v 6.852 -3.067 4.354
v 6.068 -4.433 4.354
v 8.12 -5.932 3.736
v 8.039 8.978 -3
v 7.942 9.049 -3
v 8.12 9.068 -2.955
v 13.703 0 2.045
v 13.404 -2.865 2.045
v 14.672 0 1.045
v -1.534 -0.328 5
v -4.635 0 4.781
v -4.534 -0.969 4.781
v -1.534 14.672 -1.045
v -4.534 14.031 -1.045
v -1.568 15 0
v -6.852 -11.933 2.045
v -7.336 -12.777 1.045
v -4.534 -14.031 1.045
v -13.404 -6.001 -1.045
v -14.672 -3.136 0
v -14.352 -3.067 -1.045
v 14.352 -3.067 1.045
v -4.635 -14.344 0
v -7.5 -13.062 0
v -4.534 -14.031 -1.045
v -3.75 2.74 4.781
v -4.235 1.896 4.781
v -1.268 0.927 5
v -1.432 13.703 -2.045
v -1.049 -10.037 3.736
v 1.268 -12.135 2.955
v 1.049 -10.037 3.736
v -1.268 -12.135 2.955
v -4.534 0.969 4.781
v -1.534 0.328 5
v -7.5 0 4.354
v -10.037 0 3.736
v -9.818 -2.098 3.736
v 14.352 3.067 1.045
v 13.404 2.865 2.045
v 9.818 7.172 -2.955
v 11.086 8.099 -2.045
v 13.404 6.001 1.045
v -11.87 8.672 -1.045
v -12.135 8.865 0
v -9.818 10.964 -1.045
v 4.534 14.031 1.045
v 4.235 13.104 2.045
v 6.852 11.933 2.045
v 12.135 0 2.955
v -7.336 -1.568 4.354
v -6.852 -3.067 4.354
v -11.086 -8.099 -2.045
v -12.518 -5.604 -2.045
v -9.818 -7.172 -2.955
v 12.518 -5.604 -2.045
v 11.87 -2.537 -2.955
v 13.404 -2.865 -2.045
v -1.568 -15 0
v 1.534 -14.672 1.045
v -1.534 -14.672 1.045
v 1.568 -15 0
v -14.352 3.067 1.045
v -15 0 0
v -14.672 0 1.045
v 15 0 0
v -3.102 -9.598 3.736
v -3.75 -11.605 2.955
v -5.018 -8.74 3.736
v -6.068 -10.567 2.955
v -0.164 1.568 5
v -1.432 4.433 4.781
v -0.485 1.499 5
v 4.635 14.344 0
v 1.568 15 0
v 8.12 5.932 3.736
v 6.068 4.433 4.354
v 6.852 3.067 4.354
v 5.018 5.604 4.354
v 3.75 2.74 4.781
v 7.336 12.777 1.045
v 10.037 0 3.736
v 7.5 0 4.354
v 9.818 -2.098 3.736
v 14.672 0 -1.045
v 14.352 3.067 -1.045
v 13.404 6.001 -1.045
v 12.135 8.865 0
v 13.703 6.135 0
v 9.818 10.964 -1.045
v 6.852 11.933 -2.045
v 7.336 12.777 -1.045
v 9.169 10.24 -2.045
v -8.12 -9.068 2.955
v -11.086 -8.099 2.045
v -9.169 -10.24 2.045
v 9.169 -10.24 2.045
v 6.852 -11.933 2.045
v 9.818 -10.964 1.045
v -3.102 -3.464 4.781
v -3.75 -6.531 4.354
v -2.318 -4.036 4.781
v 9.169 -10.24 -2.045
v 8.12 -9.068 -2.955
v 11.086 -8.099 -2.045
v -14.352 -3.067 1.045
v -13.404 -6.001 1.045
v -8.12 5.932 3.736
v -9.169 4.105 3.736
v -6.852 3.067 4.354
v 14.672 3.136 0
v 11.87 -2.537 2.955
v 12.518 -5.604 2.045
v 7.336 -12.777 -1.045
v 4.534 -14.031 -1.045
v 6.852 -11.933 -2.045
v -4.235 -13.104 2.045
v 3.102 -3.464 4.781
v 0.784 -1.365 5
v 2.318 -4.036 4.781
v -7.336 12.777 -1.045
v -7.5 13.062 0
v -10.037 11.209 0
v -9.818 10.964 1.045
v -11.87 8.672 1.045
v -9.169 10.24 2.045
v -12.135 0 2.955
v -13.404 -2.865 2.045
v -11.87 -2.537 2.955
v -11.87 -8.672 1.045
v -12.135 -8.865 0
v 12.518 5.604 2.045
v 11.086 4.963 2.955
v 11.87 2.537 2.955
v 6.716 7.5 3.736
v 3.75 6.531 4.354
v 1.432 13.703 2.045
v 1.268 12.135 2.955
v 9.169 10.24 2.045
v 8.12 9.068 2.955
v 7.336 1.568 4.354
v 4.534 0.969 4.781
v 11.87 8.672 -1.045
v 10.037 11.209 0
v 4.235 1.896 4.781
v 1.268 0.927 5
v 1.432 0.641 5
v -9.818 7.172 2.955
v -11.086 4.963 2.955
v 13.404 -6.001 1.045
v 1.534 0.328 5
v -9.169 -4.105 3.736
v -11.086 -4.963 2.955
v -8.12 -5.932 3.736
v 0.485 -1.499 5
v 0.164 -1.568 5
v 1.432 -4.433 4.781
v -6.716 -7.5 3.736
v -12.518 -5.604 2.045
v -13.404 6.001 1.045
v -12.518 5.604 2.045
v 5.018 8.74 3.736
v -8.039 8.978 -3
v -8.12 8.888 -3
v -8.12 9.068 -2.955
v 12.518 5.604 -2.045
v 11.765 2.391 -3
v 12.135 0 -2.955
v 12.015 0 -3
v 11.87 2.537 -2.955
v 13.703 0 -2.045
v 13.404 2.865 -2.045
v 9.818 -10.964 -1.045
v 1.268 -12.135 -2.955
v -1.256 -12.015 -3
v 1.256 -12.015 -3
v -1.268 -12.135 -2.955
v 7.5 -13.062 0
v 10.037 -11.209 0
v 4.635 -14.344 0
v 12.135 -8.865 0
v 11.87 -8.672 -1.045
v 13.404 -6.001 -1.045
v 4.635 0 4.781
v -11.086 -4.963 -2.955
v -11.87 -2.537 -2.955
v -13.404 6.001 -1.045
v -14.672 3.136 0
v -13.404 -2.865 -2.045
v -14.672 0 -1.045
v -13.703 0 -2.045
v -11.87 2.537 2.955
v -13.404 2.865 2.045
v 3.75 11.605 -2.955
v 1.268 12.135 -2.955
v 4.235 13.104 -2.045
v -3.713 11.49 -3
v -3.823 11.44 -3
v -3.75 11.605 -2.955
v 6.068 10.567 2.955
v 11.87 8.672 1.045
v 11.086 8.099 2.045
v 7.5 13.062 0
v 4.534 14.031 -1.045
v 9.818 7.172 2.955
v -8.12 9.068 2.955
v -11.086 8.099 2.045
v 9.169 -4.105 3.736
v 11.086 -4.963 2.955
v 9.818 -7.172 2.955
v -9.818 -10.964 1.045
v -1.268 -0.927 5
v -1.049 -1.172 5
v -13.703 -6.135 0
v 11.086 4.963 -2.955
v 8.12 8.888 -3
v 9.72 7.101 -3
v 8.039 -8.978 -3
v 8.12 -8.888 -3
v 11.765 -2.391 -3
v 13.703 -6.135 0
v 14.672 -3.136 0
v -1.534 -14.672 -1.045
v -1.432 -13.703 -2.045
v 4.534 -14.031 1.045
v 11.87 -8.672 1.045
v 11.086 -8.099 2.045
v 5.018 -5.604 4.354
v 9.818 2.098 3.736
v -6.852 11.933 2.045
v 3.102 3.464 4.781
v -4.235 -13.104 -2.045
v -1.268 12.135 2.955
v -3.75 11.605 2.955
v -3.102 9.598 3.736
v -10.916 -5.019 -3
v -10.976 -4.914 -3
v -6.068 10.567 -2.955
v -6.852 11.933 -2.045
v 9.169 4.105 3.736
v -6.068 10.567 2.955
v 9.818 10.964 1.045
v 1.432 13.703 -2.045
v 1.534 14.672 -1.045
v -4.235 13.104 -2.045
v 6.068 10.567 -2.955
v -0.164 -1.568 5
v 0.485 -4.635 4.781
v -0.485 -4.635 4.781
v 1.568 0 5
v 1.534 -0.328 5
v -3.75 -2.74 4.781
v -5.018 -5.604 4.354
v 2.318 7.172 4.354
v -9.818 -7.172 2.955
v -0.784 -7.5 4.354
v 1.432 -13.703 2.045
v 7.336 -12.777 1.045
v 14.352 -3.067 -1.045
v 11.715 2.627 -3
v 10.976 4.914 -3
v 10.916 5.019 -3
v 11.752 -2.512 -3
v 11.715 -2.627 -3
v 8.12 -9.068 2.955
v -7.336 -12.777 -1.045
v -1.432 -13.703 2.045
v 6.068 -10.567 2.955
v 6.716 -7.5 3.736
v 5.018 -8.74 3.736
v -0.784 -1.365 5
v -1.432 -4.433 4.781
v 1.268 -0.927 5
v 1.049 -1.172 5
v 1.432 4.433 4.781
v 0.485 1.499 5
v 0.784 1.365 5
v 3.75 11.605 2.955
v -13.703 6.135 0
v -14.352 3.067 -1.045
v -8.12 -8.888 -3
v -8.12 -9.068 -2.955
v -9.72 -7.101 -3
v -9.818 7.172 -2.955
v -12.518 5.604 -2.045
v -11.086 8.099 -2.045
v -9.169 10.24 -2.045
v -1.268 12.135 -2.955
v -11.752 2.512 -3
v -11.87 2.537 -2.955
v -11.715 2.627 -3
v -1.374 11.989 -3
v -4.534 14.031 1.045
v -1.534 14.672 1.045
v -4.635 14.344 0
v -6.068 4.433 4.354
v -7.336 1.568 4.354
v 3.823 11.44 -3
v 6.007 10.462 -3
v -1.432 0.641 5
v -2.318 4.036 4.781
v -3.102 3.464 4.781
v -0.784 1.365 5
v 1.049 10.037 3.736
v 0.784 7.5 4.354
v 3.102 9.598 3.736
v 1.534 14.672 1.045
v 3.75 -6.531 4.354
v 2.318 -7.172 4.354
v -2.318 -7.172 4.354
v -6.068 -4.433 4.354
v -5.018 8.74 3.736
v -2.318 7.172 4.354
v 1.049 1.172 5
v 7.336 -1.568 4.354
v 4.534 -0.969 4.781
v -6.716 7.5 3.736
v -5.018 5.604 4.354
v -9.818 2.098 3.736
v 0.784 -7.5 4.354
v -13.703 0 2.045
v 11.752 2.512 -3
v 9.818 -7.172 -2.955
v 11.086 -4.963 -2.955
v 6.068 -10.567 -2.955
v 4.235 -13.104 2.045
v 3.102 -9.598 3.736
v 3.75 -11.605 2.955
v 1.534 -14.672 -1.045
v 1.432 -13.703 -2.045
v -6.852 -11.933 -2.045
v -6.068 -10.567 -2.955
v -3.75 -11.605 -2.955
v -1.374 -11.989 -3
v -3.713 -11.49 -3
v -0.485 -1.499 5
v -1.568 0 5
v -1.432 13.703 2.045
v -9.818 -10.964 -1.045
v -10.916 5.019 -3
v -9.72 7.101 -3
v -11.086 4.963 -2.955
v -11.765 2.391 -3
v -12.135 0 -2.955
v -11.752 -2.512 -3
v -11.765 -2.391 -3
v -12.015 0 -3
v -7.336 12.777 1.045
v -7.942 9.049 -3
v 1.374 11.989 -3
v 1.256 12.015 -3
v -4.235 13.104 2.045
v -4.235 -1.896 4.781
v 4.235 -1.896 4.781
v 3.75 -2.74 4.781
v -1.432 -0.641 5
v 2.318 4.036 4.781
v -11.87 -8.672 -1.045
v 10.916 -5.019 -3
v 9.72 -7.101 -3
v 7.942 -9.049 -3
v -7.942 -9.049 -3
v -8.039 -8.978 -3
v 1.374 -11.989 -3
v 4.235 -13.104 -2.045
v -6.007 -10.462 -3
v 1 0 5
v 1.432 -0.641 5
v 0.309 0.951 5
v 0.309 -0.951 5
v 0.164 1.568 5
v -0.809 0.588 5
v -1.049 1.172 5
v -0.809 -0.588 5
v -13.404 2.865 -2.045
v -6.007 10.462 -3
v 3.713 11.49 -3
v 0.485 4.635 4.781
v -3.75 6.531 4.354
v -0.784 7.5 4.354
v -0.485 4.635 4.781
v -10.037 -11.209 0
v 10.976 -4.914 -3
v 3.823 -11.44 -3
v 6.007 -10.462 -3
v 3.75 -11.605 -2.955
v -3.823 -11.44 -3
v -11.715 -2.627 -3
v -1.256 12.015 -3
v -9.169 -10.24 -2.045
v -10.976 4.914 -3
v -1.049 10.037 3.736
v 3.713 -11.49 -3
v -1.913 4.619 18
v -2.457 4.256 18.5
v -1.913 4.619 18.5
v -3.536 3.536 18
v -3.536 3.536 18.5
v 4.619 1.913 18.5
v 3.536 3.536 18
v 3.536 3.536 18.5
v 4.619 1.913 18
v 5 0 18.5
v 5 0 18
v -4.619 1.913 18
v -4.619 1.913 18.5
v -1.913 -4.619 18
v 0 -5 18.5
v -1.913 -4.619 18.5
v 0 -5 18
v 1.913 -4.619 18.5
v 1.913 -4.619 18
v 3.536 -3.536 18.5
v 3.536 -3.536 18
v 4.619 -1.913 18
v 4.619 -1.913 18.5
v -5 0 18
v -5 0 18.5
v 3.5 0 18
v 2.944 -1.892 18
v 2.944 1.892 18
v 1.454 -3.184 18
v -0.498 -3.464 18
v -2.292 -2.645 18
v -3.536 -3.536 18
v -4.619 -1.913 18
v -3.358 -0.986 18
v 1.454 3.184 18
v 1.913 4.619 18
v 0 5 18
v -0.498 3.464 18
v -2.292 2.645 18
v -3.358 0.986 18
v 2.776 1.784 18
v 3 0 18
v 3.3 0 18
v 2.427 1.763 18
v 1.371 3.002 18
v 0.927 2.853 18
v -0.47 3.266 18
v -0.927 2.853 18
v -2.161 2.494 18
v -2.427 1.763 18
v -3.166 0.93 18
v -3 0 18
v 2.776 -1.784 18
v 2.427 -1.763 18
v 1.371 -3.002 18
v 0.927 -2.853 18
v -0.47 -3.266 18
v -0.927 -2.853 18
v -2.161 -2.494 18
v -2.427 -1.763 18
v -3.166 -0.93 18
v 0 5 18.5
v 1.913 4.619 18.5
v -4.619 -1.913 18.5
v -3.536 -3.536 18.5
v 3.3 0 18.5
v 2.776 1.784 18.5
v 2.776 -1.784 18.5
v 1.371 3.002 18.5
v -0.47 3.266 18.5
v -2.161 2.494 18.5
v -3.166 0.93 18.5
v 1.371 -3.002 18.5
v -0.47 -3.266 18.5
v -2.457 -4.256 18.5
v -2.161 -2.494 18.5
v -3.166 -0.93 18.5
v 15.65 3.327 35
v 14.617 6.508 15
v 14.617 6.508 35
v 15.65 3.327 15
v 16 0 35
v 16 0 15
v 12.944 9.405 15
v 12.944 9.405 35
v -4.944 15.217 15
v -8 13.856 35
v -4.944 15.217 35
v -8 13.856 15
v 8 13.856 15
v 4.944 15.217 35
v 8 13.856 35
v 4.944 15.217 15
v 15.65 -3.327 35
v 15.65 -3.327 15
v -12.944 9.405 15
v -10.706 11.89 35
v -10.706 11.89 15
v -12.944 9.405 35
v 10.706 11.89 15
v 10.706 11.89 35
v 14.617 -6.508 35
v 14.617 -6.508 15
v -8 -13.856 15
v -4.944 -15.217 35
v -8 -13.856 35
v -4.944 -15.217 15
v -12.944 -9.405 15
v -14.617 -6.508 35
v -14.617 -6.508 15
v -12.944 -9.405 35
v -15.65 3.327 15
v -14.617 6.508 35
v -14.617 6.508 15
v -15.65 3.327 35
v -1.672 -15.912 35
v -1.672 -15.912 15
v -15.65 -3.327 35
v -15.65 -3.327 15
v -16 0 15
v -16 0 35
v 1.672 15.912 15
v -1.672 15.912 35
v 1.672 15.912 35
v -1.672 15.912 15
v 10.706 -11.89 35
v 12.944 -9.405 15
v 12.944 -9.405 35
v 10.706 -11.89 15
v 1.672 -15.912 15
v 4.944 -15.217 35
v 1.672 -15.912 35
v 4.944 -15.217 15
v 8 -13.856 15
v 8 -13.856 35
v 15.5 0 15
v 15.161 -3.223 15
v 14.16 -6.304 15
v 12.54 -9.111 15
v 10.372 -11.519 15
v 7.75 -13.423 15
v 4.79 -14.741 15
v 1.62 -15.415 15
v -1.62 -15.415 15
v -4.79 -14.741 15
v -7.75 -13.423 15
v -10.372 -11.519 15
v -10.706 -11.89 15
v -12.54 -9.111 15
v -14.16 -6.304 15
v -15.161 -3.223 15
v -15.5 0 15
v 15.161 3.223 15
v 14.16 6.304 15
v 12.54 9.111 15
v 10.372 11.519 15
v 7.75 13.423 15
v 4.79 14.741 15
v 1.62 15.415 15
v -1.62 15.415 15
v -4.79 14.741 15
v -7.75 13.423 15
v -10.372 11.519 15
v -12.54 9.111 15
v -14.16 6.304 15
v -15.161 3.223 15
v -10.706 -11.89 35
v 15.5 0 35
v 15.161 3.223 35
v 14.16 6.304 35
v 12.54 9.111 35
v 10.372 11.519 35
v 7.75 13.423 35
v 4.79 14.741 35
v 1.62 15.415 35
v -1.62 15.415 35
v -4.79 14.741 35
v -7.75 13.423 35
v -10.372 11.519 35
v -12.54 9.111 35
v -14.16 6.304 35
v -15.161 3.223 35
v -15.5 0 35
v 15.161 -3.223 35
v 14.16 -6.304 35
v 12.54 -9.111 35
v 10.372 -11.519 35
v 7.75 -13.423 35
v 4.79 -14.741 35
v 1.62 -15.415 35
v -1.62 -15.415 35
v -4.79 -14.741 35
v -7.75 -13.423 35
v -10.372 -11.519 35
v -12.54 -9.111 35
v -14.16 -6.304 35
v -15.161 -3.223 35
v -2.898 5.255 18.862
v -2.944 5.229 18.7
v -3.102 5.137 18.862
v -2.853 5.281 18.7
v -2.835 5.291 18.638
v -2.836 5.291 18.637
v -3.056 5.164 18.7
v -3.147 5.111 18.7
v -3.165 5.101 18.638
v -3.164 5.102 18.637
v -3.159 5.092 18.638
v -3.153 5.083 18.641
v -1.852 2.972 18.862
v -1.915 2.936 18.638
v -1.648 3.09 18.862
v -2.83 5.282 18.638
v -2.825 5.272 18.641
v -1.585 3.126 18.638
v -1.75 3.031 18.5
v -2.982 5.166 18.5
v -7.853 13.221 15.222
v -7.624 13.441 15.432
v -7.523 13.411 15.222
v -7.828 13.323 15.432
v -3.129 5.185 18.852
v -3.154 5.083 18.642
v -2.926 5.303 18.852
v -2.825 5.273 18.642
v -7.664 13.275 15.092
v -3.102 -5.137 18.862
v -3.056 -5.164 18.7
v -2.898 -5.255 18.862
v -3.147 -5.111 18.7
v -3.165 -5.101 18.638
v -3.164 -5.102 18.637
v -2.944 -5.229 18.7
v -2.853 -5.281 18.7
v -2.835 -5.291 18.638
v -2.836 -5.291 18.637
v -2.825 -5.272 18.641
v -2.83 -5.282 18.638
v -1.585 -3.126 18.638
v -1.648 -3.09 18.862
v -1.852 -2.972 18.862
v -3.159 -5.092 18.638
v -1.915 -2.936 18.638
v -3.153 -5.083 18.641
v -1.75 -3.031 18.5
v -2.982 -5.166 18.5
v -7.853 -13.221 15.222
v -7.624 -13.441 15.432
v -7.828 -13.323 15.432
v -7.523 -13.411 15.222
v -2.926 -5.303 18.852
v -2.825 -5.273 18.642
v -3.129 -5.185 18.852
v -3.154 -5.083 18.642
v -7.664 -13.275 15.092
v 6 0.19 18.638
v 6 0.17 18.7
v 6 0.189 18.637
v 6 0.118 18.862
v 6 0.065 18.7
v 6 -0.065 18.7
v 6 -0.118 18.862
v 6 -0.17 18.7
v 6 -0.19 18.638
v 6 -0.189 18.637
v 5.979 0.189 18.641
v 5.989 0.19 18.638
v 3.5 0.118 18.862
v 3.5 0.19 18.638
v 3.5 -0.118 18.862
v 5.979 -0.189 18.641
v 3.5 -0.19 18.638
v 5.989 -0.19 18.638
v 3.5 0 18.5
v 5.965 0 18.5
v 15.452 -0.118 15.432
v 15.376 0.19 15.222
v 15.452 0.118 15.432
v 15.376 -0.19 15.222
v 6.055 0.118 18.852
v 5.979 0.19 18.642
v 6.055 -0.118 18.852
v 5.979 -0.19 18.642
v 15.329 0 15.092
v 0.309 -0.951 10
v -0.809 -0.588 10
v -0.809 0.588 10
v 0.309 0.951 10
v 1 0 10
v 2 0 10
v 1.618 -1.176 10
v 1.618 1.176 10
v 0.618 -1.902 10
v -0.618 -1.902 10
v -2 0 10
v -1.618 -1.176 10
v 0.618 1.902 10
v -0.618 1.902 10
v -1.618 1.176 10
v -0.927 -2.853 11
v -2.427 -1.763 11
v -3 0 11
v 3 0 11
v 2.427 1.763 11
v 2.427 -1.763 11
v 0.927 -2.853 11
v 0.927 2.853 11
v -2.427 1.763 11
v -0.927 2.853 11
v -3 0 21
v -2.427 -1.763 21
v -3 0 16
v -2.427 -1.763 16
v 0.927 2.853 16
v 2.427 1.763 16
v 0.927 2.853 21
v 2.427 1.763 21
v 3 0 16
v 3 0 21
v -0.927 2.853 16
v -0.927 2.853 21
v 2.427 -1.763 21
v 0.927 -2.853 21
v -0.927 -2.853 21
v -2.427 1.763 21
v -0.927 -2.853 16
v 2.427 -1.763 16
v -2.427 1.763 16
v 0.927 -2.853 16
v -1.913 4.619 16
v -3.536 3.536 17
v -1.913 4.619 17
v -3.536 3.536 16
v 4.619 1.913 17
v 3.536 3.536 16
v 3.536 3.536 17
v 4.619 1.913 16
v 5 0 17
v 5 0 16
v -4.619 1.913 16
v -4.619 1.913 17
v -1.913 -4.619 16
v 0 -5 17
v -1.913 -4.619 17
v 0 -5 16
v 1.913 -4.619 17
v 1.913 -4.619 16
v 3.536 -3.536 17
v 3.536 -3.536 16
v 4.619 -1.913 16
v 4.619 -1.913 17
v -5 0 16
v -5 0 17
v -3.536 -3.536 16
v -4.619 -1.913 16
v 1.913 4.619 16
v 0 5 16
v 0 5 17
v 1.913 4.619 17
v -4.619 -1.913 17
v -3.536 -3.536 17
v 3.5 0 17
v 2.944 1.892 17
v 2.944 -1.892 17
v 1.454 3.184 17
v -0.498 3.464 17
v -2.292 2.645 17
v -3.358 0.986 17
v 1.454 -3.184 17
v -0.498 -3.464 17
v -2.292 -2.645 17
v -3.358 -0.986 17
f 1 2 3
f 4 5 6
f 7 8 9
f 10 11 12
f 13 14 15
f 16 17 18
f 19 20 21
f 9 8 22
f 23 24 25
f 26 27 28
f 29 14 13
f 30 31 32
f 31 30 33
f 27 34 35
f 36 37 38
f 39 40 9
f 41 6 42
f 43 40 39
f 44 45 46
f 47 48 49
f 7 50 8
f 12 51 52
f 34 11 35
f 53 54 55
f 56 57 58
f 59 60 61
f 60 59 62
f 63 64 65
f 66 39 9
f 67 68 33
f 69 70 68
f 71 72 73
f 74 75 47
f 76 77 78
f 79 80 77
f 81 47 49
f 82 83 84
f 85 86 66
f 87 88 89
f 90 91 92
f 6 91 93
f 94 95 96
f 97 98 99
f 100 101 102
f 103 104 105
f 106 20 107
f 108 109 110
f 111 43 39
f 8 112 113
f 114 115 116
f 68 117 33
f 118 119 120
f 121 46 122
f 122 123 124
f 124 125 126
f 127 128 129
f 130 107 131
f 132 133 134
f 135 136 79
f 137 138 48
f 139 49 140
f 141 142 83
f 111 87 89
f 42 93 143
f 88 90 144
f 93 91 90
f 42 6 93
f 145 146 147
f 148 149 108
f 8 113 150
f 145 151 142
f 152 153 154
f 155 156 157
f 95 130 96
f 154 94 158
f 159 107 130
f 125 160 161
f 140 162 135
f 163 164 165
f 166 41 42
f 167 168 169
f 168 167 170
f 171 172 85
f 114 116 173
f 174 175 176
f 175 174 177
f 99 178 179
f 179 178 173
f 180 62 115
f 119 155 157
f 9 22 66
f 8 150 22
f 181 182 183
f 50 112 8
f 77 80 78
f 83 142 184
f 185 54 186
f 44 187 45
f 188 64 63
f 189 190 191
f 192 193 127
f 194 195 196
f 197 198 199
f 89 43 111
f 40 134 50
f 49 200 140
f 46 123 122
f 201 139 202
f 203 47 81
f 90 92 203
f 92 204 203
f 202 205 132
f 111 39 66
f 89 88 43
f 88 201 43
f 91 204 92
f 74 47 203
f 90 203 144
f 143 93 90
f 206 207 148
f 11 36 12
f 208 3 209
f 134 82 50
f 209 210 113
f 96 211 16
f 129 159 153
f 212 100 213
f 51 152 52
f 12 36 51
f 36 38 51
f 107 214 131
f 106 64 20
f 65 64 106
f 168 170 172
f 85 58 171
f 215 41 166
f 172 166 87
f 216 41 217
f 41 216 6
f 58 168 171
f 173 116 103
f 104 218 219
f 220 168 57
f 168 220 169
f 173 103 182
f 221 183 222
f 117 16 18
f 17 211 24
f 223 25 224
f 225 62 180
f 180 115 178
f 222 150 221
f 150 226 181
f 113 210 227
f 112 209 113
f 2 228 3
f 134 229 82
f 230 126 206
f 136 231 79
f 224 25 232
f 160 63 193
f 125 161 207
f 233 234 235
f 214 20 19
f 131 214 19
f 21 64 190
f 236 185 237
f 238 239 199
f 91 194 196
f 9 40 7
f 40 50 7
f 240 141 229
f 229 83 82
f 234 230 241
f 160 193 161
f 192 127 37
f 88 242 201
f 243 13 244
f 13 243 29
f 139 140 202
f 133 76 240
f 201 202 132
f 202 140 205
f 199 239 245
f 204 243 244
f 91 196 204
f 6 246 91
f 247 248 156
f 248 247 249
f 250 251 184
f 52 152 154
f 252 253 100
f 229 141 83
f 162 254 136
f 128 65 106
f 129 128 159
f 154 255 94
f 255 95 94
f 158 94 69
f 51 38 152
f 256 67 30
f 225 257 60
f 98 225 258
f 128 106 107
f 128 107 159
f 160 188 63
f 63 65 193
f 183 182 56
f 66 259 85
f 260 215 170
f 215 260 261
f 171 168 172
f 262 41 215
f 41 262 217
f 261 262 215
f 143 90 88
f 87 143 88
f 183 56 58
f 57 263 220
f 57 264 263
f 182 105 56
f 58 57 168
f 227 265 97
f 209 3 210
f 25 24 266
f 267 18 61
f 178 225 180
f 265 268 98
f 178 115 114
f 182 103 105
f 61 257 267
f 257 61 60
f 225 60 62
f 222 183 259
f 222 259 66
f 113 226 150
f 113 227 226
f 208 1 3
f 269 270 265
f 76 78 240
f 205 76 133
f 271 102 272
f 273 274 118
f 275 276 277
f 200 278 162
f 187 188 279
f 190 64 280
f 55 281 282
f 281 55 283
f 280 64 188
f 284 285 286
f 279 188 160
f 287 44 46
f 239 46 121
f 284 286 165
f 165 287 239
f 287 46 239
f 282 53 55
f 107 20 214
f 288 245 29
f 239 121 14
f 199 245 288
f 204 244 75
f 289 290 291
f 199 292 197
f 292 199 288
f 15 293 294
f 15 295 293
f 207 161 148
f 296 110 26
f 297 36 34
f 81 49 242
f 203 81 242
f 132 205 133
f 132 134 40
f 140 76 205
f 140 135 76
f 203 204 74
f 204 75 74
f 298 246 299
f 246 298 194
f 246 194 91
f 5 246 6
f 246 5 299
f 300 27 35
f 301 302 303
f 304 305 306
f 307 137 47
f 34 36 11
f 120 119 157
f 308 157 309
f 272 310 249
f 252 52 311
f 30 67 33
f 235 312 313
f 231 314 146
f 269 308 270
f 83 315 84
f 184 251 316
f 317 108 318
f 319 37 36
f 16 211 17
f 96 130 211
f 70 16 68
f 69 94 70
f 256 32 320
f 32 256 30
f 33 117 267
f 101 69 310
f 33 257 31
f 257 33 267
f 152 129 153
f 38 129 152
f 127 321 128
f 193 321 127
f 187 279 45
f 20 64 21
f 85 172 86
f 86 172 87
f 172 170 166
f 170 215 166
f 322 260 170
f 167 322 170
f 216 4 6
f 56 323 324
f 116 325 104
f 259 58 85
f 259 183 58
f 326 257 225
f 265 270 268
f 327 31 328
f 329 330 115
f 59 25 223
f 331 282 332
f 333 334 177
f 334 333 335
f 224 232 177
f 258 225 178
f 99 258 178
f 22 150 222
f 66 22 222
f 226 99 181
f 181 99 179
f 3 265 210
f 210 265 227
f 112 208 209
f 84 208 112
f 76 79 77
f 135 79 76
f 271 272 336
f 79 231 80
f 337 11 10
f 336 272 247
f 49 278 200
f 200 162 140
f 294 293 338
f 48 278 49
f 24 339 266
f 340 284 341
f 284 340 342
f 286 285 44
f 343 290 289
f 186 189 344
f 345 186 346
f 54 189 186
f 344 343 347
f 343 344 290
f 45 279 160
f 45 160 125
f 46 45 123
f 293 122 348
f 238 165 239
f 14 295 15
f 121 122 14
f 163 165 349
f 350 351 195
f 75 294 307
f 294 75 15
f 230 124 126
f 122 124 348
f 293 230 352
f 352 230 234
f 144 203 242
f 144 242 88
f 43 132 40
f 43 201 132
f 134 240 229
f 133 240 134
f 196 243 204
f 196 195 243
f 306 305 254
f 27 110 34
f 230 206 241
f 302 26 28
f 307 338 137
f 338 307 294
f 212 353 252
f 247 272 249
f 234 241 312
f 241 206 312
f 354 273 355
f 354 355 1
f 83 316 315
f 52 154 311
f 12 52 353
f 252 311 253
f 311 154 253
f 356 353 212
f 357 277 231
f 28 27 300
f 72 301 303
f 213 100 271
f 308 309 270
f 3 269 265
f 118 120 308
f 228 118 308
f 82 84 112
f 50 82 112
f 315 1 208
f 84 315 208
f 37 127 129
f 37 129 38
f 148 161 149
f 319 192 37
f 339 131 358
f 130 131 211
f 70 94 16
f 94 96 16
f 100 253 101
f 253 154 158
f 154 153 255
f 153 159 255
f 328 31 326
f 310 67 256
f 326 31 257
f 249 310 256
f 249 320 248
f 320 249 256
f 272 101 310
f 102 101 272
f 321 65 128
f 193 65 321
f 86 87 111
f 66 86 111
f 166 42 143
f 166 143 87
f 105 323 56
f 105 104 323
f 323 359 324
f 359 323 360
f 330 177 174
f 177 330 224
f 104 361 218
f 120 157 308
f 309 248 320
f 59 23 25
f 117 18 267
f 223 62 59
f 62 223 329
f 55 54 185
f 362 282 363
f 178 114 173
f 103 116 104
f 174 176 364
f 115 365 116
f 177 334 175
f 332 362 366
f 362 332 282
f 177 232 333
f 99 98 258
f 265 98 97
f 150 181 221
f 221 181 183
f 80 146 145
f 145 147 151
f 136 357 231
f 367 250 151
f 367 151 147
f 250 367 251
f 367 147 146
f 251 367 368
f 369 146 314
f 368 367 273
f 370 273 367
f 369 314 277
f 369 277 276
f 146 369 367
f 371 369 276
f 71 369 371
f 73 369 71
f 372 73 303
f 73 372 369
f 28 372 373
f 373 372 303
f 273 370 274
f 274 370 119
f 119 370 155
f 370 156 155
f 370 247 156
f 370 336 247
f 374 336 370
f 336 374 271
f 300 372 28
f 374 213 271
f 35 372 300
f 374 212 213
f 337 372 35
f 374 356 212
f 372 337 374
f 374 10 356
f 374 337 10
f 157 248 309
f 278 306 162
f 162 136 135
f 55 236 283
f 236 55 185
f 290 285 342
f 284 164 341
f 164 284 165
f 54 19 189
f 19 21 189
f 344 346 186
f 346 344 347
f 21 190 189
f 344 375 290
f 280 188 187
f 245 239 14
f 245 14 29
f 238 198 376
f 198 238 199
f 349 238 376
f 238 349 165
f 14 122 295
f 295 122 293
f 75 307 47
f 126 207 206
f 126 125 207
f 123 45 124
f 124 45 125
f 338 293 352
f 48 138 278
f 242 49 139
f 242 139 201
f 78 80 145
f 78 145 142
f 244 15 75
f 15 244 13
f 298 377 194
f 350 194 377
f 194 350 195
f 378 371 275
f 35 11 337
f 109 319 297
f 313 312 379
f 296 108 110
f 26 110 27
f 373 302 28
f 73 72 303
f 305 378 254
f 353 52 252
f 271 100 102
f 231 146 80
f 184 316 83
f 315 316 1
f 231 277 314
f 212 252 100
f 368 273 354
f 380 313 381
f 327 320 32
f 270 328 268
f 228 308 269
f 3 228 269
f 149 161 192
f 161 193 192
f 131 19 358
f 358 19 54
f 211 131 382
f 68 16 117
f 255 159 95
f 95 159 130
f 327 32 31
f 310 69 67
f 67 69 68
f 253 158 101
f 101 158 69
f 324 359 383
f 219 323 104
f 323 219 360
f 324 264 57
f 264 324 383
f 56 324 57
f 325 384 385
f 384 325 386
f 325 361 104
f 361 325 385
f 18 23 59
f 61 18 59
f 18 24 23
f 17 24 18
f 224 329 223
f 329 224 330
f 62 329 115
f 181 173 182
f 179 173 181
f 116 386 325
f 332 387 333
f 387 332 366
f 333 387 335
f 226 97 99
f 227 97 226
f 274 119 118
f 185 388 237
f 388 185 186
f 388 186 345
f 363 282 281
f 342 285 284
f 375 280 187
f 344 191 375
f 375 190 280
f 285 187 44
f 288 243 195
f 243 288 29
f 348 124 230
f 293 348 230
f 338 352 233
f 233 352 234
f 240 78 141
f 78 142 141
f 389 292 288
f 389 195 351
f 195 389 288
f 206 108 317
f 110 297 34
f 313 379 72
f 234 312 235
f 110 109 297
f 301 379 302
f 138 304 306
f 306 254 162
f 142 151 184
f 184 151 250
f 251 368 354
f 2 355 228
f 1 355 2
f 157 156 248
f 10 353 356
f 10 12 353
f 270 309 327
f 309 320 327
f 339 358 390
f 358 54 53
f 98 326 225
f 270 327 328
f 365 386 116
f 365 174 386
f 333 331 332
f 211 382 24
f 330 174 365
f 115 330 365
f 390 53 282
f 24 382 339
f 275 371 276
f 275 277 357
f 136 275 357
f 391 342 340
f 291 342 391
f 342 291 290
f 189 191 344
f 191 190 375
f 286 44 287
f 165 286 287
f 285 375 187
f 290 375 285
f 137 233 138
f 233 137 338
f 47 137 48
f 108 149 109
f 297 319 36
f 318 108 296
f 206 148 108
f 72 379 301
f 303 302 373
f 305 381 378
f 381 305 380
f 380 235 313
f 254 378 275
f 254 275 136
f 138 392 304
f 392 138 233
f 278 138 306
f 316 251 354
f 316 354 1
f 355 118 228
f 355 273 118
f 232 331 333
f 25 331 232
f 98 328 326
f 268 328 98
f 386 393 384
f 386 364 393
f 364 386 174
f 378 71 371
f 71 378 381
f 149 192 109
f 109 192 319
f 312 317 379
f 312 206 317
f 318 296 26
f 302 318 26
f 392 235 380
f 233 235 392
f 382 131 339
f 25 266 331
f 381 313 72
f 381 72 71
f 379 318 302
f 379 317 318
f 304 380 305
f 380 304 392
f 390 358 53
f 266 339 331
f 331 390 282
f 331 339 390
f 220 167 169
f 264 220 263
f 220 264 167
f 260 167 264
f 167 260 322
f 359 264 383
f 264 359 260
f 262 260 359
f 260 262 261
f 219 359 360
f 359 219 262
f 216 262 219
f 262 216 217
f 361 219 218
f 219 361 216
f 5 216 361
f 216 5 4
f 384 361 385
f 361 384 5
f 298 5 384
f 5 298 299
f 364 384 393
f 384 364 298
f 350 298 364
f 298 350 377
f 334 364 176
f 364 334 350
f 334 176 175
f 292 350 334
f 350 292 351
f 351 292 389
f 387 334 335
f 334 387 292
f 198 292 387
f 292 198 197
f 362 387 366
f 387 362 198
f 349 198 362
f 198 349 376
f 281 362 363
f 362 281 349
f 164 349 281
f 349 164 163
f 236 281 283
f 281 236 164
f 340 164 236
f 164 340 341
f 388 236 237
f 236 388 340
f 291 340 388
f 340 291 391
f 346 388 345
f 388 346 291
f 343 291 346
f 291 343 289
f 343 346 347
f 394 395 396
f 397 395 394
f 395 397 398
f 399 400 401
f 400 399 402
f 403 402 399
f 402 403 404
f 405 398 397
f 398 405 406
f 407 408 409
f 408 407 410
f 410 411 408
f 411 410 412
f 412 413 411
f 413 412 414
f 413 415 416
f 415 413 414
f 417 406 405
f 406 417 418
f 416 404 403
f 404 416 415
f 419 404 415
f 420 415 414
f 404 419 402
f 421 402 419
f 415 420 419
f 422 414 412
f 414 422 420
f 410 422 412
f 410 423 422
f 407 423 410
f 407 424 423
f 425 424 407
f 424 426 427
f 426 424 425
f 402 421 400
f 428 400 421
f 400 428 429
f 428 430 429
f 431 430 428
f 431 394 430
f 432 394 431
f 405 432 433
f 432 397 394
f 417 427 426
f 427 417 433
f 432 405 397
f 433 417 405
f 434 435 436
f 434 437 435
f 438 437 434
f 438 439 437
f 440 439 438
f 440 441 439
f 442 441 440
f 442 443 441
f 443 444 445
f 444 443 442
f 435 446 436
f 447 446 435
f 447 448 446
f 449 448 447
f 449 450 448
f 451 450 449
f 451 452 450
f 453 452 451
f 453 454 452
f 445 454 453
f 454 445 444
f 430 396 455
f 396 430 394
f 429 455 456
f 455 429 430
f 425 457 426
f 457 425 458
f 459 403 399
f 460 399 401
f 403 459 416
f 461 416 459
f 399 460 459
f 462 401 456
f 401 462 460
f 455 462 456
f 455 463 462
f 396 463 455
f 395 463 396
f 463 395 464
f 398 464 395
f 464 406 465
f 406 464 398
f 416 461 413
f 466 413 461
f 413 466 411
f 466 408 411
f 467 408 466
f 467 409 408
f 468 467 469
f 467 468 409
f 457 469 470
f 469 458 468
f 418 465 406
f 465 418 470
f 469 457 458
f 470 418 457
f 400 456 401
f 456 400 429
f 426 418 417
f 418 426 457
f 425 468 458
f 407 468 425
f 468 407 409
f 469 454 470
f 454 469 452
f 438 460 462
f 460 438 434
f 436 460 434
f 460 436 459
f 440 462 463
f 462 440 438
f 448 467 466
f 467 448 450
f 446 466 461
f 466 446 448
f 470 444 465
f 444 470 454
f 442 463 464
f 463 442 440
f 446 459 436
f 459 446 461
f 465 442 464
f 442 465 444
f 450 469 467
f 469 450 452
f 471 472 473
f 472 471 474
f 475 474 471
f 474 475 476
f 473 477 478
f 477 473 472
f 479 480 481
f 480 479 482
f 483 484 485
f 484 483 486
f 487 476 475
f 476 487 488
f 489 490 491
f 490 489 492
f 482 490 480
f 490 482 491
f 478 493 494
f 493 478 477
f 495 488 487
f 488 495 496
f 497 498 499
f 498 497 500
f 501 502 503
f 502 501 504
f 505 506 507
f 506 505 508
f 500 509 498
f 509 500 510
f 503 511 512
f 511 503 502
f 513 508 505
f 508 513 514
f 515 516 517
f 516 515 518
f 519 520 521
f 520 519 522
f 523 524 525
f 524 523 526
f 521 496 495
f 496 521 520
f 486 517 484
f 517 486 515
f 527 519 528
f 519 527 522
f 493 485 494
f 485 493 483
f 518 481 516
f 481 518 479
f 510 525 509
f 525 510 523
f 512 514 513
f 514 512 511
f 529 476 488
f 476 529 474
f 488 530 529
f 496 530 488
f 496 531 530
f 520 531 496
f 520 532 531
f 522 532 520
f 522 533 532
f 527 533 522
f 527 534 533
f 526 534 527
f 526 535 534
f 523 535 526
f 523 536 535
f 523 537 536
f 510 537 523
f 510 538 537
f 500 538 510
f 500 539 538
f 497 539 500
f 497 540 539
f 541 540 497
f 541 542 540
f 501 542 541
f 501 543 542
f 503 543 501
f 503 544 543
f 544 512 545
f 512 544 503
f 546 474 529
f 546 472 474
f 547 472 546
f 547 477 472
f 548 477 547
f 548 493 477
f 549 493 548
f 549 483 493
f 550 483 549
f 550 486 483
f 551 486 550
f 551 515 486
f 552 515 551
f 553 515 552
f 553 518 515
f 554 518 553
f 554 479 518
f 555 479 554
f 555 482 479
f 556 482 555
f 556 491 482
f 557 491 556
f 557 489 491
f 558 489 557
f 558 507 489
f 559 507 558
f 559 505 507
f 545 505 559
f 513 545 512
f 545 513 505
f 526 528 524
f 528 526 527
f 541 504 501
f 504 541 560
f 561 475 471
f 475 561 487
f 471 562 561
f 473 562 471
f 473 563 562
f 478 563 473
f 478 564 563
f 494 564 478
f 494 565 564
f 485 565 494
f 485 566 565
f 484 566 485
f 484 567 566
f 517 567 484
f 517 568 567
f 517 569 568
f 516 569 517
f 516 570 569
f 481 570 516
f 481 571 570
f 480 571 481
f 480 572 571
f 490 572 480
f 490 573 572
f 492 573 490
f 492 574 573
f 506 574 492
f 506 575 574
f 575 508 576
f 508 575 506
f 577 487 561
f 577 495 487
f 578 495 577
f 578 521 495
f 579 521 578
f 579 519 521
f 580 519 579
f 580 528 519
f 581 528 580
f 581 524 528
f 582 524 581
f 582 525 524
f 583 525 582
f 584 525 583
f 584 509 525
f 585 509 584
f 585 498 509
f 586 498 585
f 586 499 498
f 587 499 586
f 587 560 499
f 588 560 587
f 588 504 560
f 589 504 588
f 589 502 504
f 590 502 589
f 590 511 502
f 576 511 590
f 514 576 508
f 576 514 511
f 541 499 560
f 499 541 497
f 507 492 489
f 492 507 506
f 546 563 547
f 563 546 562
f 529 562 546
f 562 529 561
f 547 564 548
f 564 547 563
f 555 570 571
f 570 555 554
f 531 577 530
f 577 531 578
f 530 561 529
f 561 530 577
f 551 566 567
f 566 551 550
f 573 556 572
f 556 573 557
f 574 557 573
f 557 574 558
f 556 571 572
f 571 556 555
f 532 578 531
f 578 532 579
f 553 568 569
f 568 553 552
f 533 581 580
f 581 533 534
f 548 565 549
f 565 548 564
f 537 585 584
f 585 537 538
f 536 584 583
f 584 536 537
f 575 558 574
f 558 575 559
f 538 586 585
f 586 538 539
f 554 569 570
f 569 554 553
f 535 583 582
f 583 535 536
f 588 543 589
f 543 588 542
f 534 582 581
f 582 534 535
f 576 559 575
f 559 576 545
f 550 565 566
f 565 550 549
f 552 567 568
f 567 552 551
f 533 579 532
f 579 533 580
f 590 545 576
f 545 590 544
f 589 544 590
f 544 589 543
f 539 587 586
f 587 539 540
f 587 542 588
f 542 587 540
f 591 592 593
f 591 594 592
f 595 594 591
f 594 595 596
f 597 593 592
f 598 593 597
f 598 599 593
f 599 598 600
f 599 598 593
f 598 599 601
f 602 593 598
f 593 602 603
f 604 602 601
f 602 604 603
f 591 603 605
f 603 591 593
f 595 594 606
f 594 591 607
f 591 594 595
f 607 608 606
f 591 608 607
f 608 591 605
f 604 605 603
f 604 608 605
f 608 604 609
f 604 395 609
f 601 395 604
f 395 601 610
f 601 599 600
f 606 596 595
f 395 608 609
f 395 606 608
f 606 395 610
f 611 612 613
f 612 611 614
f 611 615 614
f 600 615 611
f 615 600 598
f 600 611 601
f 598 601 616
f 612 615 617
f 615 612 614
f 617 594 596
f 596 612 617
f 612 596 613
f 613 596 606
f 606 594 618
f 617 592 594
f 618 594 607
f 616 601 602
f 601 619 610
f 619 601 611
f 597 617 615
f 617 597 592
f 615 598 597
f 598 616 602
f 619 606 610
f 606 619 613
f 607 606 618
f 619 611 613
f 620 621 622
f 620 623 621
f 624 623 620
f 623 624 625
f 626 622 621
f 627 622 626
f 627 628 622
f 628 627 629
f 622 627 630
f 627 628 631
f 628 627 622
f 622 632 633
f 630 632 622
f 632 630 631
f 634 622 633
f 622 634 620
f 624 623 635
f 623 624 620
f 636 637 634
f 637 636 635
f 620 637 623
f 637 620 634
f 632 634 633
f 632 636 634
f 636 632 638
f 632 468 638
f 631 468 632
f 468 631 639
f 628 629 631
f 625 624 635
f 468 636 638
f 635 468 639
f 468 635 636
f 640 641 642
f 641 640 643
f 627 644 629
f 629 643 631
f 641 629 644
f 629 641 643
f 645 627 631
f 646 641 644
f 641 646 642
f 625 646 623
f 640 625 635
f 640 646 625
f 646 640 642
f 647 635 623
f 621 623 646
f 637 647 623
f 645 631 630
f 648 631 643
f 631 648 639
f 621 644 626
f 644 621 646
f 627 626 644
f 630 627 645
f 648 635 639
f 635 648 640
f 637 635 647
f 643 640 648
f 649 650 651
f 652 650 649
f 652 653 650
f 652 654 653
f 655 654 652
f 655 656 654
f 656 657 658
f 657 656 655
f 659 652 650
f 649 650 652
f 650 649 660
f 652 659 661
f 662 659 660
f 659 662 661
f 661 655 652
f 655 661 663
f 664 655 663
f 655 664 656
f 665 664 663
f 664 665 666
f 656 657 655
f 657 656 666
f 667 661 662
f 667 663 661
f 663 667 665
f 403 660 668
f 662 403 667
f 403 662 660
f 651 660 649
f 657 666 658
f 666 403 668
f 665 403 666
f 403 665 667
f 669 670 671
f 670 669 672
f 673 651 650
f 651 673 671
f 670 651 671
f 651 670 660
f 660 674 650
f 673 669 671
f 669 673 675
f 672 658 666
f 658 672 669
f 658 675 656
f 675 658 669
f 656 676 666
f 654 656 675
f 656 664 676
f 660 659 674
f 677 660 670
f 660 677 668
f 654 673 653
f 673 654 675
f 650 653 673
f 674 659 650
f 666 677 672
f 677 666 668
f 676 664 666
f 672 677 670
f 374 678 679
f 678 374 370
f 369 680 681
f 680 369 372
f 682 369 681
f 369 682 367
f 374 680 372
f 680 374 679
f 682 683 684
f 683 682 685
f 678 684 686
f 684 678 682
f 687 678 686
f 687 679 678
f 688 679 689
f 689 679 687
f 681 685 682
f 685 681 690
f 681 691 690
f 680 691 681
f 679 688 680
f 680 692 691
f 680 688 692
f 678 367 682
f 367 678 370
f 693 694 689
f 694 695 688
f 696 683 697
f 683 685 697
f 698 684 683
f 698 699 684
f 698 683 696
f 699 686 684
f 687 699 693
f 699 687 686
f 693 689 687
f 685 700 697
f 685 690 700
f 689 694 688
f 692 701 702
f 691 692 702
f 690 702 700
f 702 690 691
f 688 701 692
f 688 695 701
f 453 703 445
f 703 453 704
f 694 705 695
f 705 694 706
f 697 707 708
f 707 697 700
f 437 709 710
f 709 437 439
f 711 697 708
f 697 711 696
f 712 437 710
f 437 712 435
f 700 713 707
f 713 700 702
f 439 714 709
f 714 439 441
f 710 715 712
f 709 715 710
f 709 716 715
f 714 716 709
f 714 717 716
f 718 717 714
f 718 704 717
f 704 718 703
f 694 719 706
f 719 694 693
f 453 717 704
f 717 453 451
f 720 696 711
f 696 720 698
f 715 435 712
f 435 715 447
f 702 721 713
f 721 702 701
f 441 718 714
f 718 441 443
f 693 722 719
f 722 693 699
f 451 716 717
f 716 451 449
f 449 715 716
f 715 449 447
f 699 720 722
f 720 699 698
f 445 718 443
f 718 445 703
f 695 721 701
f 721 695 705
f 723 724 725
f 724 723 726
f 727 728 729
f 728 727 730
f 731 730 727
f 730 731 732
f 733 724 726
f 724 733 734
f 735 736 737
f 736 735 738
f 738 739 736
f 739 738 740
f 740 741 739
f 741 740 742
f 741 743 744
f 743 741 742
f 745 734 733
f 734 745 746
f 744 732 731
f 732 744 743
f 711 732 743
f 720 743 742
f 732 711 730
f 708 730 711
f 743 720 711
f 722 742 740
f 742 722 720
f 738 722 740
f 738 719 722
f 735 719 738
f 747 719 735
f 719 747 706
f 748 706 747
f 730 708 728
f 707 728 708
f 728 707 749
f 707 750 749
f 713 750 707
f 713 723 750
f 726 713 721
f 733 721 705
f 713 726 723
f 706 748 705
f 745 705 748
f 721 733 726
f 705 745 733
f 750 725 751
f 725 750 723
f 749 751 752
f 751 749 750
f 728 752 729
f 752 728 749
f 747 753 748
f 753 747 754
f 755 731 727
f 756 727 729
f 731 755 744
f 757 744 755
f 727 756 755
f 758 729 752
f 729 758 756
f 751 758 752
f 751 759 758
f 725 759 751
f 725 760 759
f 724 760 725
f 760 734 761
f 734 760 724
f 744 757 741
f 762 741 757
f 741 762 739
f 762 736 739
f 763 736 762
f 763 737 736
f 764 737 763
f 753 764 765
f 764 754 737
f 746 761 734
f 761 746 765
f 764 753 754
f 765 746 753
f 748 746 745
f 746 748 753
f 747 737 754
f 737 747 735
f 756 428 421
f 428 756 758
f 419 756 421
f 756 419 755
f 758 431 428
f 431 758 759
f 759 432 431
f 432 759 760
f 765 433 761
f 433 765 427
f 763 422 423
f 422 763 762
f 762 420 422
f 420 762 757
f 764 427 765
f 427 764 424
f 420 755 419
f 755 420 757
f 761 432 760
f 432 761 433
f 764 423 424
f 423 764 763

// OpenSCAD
module base(height, radius)
{
    difference(){
        color("bisque") resize(newsize=[height,height,radius])  sphere(r=radius);
        translate([-20,-20,-8]) color("black") cube([40,40,5]);
    }
}

module support(height, bottomRadius, topRadius, culoare)
{
    color(culoare) cylinder(h = height, r1 = bottomRadius, r2 = topRadius);
}

module thinTopSupport()
{
    color("white") 
    translate([3.5,0,18.7])
        rotate([0,90,0])
            cylinder(2.5,0.2,0.2);
    
    color("white")
    translate([6,0,18.7])
        rotate([0,110,0])
            cylinder(10,0.2,0.2);
}

module topSupport(height, bottomRadius, topRadius)
{
    
    difference(){
       color("white") cylinder(height, bottomRadius, topRadius);
        cylinder(height, bottomRadius-1.7, topRadius-1.7);
    }
}

module top()
{
    difference(){
        color("bisque") cylinder(20,16,16);
       color("white") translate([0,0,-0.1]) cylinder(20.2,15.5,15.5);
    }
}    

base(30, 10);
translate([0,0,5]) support(5,1,1,"LightGrey");
translate([0,0,10]) support(1,2,3,"black");
translate([0,0,11]) support(10,3,3,"black");
translate([0,0,16]) support(1,5,5,"black");
translate([0,0,17]) support(1,3.5,3.5,"black");

translate([0,0,18]) topSupport(0.5,5,5);
translate([0,0,15]) top();

for( i=[1:1:3] ) {
    rotate([0,0,i*360/3]) thinTopSupport();
}
